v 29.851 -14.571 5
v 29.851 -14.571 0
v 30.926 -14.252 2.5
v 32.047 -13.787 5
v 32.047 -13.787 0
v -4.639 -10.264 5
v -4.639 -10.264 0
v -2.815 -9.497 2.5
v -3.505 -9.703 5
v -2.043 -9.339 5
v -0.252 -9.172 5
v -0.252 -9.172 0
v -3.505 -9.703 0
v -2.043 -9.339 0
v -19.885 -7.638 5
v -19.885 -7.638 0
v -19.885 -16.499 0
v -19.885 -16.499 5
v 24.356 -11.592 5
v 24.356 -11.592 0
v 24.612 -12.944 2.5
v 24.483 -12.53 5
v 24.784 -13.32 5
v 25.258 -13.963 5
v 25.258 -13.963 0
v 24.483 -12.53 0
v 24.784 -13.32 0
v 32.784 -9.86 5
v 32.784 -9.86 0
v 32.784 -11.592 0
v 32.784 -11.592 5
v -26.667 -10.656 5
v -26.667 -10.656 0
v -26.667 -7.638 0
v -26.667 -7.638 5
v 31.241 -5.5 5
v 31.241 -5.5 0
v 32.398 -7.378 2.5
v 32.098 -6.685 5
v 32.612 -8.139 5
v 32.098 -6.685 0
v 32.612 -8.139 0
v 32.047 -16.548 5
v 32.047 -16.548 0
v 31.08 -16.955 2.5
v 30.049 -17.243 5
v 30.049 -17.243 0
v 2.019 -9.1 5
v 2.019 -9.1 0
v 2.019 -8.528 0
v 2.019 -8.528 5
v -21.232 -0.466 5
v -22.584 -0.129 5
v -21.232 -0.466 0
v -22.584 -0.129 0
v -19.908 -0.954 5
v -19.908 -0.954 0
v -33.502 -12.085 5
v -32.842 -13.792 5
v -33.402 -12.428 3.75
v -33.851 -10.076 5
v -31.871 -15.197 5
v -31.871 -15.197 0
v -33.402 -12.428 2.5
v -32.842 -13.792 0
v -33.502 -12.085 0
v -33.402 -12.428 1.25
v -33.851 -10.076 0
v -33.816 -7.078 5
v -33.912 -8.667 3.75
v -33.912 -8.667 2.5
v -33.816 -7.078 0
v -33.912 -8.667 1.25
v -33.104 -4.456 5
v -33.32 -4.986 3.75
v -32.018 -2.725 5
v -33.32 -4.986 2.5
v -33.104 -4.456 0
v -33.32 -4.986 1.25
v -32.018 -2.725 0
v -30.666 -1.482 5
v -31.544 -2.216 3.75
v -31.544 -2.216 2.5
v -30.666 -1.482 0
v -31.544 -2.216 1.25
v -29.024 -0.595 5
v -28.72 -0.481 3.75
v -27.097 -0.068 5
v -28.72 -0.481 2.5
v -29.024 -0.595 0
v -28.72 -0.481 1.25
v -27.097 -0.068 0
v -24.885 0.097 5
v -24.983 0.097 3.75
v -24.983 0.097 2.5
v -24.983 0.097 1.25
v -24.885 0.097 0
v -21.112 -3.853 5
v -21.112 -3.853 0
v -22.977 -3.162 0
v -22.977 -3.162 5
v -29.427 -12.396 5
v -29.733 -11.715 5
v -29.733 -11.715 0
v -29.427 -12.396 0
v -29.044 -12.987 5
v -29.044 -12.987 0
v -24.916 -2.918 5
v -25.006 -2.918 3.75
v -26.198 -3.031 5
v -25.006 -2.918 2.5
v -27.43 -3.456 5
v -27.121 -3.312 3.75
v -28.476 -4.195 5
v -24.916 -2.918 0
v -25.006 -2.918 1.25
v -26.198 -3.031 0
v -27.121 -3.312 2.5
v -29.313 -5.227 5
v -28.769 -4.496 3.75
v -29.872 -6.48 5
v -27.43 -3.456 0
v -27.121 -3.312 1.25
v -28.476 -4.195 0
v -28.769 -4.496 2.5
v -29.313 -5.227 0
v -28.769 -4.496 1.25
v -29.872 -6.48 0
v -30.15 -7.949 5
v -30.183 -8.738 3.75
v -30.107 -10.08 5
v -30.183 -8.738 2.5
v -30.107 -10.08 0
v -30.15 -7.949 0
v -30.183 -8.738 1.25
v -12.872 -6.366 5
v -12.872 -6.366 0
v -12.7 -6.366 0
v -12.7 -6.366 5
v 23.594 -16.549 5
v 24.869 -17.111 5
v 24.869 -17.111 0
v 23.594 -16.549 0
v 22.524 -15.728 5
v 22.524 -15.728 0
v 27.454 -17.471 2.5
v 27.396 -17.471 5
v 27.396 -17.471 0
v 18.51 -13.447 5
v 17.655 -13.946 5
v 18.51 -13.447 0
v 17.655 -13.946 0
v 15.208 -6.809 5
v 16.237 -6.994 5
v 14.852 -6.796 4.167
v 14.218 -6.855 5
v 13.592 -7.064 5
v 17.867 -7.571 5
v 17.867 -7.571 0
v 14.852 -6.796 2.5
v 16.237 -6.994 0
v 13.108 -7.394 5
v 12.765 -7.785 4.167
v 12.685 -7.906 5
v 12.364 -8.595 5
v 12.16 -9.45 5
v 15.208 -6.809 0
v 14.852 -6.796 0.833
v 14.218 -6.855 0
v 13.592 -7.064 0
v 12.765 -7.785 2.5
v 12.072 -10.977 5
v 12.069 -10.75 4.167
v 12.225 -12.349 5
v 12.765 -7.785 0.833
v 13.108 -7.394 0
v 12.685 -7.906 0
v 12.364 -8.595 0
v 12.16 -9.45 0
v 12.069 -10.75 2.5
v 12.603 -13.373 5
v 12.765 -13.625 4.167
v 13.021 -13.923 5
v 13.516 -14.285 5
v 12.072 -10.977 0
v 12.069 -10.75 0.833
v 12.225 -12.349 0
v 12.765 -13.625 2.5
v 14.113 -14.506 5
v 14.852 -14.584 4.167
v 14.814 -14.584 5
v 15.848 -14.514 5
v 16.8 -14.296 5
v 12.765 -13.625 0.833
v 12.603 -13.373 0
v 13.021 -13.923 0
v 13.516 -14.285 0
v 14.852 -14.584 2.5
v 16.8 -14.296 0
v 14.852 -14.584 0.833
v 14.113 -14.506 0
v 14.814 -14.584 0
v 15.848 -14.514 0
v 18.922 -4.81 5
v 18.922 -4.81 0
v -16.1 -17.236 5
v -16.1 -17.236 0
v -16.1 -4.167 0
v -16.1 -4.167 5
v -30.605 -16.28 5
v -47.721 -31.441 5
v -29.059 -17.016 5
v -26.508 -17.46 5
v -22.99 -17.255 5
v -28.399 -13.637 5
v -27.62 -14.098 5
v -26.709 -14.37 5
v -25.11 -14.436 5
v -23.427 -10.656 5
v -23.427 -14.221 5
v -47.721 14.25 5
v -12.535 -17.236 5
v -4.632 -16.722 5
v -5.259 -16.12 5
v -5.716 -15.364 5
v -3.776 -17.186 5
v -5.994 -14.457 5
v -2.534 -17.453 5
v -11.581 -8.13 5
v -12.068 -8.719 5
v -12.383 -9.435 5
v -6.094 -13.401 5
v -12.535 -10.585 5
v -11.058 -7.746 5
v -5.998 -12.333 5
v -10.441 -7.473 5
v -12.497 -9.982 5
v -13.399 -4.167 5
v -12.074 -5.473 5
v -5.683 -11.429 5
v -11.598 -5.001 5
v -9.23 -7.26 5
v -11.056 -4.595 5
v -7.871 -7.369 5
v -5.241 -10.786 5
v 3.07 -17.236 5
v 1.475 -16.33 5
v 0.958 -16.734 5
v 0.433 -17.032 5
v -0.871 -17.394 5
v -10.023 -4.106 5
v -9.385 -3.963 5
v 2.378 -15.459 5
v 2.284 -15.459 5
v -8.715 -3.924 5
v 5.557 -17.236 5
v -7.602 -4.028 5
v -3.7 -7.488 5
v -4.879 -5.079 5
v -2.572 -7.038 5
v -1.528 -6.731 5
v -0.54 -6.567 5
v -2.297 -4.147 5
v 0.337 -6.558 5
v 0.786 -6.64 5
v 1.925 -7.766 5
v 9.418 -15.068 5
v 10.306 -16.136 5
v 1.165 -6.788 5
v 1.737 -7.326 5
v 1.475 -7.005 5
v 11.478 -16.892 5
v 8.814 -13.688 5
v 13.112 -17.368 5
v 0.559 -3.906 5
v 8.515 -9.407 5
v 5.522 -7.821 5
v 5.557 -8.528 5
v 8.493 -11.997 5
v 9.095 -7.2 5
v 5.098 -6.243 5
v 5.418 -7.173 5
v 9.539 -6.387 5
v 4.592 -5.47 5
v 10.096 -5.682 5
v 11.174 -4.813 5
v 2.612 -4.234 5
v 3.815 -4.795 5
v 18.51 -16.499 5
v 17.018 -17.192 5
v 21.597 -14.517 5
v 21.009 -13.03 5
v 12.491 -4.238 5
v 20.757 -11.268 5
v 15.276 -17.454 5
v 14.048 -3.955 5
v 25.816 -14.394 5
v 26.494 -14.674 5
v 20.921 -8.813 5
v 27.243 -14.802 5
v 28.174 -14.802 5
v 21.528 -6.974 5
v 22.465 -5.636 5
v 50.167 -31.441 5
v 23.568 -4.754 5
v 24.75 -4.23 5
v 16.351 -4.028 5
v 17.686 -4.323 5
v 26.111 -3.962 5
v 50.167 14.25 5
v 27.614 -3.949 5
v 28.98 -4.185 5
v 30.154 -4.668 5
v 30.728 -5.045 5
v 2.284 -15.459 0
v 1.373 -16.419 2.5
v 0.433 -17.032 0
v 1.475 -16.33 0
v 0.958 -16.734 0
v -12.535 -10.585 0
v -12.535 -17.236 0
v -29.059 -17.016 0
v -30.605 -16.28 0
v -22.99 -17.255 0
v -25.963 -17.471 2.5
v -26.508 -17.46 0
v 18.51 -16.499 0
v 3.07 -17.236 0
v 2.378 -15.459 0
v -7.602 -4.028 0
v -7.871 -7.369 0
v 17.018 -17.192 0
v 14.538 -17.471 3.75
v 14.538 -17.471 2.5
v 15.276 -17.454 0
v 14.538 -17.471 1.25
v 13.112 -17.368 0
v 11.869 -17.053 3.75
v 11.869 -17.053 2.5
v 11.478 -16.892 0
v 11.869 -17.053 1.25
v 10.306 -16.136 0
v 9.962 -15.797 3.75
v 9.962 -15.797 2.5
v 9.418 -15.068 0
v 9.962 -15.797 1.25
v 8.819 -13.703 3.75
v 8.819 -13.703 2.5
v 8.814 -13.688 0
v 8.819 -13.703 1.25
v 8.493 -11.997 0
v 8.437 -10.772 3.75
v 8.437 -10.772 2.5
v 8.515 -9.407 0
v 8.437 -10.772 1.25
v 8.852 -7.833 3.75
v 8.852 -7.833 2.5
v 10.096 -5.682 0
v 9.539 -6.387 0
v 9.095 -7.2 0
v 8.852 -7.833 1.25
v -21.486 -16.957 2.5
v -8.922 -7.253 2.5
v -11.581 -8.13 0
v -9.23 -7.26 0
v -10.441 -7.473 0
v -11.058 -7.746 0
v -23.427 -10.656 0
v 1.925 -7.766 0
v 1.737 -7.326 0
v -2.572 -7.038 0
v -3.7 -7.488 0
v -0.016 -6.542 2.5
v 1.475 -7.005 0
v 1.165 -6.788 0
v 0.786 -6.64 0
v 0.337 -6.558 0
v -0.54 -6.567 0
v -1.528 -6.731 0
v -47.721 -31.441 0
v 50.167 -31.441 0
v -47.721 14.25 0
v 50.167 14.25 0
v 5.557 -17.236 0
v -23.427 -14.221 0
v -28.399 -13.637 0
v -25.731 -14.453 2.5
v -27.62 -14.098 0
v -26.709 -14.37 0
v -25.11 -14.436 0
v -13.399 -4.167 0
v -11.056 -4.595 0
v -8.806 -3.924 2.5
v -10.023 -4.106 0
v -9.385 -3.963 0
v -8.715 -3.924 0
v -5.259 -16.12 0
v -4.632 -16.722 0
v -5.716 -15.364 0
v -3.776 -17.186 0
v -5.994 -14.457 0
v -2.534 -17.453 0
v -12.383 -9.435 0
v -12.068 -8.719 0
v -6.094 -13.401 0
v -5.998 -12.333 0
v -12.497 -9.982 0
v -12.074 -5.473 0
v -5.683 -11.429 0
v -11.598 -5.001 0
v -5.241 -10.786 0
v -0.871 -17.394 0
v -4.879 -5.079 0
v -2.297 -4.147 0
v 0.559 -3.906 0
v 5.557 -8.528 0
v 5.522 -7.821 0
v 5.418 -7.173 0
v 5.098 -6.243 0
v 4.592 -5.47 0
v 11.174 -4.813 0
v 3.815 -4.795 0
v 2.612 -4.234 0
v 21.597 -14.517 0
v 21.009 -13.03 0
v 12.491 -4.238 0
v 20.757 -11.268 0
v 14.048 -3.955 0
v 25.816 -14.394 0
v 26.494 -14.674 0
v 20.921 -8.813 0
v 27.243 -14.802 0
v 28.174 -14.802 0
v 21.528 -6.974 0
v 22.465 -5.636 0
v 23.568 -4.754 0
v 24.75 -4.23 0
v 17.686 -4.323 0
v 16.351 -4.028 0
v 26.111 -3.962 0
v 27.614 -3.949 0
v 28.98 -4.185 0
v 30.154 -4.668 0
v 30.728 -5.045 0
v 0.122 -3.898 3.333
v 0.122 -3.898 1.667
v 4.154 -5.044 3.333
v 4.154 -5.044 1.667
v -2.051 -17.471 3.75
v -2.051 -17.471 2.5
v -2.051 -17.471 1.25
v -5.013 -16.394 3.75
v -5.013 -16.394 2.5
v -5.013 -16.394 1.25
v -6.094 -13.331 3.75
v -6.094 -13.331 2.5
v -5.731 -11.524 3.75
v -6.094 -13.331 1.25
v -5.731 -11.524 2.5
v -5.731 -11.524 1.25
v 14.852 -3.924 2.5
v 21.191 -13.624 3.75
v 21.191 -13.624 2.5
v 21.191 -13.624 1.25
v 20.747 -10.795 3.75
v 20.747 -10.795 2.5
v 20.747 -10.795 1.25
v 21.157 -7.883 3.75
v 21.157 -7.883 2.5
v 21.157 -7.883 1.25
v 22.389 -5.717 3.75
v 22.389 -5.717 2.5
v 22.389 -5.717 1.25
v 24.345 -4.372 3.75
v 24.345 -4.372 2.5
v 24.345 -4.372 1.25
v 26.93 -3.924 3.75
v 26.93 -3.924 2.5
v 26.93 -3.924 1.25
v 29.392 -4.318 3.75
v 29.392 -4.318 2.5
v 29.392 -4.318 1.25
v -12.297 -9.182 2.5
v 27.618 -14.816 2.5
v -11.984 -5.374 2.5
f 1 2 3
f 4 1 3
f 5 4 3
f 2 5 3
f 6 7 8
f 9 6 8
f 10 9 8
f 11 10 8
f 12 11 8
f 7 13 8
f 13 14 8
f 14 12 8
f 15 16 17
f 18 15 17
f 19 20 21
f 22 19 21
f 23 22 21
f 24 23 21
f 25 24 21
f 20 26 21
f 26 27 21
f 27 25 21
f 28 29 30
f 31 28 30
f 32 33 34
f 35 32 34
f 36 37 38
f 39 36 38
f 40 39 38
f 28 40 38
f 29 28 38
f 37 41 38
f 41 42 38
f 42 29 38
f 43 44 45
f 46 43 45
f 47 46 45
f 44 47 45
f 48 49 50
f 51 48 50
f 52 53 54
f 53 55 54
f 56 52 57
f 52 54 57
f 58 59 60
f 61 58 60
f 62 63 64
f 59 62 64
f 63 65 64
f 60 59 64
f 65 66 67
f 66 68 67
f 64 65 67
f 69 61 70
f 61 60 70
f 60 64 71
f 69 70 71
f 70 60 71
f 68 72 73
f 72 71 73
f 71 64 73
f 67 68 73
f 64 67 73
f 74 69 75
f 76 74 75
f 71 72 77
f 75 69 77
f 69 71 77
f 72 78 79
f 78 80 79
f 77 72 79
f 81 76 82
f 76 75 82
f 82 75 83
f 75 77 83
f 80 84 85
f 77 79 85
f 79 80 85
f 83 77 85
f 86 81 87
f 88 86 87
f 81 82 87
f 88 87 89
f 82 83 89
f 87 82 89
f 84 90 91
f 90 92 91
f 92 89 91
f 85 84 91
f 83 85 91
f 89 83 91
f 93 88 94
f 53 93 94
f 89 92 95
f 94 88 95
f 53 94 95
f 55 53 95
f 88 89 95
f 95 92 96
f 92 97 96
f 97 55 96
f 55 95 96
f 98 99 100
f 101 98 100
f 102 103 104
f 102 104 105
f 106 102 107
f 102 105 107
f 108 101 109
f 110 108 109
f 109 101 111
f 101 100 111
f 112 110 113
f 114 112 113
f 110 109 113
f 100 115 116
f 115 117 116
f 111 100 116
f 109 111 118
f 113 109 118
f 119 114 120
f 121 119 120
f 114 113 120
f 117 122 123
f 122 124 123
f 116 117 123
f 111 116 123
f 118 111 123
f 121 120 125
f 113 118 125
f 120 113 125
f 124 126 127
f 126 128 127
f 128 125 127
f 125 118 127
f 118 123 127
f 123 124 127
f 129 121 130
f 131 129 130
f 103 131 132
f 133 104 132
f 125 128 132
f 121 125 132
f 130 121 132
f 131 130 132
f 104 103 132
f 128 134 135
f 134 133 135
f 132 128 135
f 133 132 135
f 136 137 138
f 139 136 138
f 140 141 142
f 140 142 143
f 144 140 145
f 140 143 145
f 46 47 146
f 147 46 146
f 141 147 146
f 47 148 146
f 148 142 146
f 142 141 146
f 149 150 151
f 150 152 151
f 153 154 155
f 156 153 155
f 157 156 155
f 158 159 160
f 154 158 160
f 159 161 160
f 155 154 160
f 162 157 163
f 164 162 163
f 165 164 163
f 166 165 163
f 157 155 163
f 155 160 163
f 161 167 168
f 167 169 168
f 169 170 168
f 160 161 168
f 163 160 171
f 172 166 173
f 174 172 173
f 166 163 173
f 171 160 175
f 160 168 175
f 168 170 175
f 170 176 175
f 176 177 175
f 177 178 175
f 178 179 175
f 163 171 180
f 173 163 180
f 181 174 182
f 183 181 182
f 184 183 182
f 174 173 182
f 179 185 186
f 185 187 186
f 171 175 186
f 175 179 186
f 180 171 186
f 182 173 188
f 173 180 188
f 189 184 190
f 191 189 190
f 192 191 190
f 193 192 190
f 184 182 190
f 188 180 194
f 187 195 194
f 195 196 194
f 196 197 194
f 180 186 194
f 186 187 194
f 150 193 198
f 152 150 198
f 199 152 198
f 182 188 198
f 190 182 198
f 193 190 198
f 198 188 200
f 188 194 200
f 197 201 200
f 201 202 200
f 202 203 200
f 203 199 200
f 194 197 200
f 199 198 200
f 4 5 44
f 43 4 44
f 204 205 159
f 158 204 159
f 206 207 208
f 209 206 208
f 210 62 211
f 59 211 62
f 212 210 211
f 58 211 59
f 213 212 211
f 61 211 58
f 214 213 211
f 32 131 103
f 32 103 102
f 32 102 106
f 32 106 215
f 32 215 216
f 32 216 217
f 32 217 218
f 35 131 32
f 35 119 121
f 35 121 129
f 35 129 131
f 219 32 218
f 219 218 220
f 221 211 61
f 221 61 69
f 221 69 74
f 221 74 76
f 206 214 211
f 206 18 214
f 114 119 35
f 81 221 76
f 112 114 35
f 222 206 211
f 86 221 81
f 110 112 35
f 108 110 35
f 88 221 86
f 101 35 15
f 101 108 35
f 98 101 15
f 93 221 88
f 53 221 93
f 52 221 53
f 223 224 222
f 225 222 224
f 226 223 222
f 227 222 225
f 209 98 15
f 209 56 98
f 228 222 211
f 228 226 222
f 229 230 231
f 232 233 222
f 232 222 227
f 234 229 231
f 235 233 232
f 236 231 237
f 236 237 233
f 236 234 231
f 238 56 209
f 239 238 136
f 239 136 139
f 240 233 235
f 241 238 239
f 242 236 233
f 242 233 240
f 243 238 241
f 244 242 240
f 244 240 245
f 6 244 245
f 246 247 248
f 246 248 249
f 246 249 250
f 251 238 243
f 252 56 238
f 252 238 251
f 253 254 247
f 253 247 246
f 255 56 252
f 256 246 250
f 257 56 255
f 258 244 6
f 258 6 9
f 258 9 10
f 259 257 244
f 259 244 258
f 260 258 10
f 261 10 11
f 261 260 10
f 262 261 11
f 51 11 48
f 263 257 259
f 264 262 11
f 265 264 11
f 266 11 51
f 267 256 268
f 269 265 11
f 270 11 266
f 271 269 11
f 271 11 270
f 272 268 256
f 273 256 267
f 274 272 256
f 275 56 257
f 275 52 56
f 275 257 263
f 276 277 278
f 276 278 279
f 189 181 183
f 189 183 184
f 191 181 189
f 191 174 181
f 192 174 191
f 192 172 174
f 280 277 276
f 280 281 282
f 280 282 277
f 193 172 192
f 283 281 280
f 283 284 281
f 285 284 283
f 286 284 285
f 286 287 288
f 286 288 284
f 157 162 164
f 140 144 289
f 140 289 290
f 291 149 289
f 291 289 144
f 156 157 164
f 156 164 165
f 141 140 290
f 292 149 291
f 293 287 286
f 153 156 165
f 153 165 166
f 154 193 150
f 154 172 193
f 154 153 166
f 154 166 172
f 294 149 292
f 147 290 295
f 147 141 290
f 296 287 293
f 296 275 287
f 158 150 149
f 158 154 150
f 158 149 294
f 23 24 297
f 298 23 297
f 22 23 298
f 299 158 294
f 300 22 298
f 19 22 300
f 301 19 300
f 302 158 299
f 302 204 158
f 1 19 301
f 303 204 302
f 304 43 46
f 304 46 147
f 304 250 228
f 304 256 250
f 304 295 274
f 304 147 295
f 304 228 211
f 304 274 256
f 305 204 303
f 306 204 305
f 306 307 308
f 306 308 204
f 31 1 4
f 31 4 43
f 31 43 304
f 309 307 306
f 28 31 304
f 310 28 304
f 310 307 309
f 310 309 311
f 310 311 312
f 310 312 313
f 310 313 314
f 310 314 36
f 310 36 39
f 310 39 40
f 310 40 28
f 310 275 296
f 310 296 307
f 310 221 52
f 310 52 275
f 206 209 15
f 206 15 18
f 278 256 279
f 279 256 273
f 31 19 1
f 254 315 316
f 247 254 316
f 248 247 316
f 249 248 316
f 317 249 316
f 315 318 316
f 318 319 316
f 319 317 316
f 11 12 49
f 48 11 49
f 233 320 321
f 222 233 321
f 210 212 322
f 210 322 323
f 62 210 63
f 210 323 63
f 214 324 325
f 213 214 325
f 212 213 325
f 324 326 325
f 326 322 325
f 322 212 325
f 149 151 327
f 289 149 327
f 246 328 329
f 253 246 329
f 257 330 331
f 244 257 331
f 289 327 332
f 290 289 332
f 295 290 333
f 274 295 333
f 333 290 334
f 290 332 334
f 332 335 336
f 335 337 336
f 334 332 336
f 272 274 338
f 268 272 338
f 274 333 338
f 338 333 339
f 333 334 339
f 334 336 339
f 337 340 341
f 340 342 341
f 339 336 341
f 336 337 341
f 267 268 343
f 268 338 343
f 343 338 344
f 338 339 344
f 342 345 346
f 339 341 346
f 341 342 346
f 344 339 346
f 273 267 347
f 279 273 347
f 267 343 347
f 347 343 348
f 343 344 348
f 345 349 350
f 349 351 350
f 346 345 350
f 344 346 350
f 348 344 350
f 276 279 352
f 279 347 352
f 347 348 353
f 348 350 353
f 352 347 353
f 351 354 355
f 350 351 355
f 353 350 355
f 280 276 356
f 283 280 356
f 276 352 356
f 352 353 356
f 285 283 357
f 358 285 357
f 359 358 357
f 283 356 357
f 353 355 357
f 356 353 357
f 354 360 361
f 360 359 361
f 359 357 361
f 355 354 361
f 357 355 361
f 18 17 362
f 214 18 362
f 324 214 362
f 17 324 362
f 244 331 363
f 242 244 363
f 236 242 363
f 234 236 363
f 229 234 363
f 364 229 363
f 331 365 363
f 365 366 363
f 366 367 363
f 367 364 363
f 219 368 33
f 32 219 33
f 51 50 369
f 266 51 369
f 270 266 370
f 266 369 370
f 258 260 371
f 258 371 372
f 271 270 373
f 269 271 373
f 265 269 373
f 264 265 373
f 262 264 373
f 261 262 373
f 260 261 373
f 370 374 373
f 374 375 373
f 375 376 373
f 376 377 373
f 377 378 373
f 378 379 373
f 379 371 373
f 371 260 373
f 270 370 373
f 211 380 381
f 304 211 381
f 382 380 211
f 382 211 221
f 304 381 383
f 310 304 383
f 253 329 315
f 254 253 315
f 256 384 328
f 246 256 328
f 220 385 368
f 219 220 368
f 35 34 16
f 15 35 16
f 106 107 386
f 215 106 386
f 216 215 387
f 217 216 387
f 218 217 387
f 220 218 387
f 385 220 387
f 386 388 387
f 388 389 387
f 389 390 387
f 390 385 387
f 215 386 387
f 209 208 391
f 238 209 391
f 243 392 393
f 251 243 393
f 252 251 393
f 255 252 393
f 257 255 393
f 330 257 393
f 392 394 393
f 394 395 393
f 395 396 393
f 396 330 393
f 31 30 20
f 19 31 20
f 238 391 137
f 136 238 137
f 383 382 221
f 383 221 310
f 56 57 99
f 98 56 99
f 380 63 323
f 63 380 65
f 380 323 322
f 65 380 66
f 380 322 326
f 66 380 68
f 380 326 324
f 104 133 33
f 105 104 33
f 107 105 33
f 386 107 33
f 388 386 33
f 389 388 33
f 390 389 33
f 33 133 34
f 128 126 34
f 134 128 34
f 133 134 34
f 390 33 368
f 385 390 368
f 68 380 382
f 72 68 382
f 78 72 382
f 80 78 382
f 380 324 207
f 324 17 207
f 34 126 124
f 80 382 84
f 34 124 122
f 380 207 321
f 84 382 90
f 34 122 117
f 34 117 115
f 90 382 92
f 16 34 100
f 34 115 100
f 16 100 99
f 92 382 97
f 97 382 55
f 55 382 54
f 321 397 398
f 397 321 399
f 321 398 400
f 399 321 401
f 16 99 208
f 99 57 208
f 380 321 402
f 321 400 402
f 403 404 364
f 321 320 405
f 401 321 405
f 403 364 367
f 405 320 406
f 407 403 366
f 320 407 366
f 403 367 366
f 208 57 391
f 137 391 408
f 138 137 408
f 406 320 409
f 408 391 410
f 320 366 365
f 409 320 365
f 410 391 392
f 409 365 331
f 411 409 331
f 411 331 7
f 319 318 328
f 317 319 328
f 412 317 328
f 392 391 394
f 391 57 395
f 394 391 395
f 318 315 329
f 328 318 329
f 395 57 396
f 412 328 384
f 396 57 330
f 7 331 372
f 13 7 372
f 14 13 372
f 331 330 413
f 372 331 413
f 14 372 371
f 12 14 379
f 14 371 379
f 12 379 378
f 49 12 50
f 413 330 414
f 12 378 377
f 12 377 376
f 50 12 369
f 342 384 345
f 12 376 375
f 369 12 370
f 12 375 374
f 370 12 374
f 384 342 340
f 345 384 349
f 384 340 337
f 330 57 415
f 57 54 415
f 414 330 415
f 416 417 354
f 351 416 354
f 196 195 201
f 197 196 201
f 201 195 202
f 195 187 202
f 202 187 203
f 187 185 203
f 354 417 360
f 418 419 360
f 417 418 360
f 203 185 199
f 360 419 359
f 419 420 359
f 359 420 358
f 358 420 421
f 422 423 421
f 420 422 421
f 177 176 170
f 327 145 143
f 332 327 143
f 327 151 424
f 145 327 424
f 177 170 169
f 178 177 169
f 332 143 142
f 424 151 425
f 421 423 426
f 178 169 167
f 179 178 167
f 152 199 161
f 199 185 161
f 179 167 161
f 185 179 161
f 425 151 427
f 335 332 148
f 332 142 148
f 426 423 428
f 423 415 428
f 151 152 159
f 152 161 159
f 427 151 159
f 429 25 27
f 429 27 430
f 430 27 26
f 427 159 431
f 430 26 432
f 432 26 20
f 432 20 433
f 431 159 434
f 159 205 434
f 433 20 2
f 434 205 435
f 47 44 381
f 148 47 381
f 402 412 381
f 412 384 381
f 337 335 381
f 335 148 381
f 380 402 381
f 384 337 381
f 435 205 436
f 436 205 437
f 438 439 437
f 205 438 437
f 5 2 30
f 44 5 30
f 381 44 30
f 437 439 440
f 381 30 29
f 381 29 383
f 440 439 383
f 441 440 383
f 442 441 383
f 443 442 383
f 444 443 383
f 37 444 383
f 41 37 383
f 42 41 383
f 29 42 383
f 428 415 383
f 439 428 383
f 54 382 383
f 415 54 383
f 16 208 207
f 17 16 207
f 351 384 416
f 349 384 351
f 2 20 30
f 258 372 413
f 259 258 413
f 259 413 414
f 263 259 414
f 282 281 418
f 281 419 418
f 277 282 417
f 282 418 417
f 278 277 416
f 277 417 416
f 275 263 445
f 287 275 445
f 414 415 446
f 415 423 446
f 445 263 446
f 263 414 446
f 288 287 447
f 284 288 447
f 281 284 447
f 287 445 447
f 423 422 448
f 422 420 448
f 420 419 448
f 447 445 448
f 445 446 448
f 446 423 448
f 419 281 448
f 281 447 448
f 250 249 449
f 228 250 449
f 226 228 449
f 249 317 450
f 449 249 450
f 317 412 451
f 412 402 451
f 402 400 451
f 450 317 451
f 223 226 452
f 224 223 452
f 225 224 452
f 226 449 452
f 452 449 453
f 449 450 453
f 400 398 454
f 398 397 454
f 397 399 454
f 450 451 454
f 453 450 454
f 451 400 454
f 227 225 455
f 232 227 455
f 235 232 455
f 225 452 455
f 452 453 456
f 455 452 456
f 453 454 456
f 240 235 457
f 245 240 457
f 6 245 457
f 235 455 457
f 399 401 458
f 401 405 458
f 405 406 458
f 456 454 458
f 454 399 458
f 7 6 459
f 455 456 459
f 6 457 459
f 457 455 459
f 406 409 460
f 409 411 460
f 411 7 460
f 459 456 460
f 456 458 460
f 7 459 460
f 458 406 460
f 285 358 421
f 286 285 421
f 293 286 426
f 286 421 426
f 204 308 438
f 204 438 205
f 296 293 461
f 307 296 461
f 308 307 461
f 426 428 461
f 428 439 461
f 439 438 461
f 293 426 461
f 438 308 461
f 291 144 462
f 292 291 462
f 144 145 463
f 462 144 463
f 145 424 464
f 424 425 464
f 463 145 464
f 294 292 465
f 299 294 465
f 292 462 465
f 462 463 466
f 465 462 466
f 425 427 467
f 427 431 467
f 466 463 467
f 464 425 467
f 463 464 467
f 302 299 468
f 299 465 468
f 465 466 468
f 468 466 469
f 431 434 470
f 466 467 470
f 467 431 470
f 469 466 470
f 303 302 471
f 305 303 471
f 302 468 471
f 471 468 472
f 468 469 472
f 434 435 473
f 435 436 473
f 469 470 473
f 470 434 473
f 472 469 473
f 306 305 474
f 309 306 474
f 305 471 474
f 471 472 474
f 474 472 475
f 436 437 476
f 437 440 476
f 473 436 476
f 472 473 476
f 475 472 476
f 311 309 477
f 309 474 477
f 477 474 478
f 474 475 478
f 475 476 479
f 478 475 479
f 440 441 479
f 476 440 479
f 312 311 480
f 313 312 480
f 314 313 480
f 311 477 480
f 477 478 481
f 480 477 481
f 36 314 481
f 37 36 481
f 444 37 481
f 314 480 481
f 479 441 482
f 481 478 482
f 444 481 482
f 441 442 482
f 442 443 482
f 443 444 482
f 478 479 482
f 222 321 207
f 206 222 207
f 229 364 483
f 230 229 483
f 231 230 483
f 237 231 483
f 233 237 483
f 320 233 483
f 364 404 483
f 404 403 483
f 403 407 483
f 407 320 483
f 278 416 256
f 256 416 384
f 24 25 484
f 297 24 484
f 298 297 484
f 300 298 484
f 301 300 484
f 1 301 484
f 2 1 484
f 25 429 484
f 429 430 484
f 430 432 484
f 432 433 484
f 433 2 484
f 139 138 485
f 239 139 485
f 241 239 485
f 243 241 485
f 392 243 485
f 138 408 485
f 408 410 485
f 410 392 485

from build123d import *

# Parameters (mm, degrees)
F0_W     = 97.8876724839
F0_H     = 45.6908610649
F1_DEPTH = 5


with BuildPart() as f1:
    # F0 (on Top) → F1 (new body)
    with BuildSketch(Plane.XY):
        with Locations((1.2231161818, -8.5958049167)):
            Rectangle(F0_W, F0_H)
        with BuildLine():
            Line((-26.666582018, -10.6564535441), (-26.666582018, -7.637935464))
            Line((-26.666582018, -7.637935464), (-19.8852024899, -7.637935464))
            Line((-19.8852024899, -7.637935464), (-19.8852024899, -16.4989879196))
            add(Edge.make_bspline(
                [(-19.8852024899, -16.4989879196), (-21.53472724, -17.0376082461), (-22.9897502054, -17.2545525443)],
                knots=[0, 0, 0, 1, 1, 1], degree=2))
            add(Edge.make_bspline(
                [(-22.9897502054, -17.2545525443), (-24.4447731709, -17.4714968425), (-25.9633832583, -17.4714968425)],
                knots=[0, 0, 0, 1, 1, 1], degree=2))
            add(Edge.make_bspline(
                [(-25.9633832583, -17.4714968425), (-29.8309764364, -17.4714968425), (-31.8713749652, -15.1973221304)],
                knots=[0, 0, 0, 1, 1, 1], degree=2))
            add(Edge.make_bspline(
                [(-31.8713749652, -15.1973221304), (-33.9117734939, -12.9231474183), (-33.9117734939, -8.666550671)],
                knots=[0, 0, 0, 1, 1, 1], degree=2))
            add(Edge.make_bspline(
                [(-33.9117734939, -8.666550671), (-33.9117734939, -4.5296473295), (-31.5440883084, -2.2161982186)],
                knots=[0, 0, 0, 1, 1, 1], degree=2))
            add(Edge.make_bspline(
                [(-31.5440883084, -2.2161982186), (-29.1764031229, 0.0972508923), (-24.9833934975, 0.0972508923)],
                knots=[0, 0, 0, 1, 1, 1], degree=2))
            add(Edge.make_bspline(
                [(-24.9833934975, 0.0972508923), (-22.3501385677, 0.0972508923), (-19.9076450035, -0.9538068283)],
                knots=[0, 0, 0, 1, 1, 1], degree=2))
            Line((-19.9076450035, -0.9538068283), (-21.1120599004, -3.8526315024))
            add(Edge.make_bspline(
                [(-21.1120599004, -3.8526315024), (-22.9822693676, -2.9175267688), (-25.0058360111, -2.9175267688)],
                knots=[0, 0, 0, 1, 1, 1], degree=2))
            add(Edge.make_bspline(
                [(-25.0058360111, -2.9175267688), (-27.3548191019, -2.9175267688), (-28.7686974591, -4.4959835591)],
                knots=[0, 0, 0, 1, 1, 1], degree=2))
            add(Edge.make_bspline(
                [(-28.7686974591, -4.4959835591), (-30.1825758163, -6.0744403494), (-30.1825758163, -8.7376186307)],
                knots=[0, 0, 0, 1, 1, 1], degree=2))
            add(Edge.make_bspline(
                [(-30.1825758163, -8.7376186307), (-30.1825758163, -11.5204903179), (-29.0436182508, -12.9867345402)],
                knots=[0, 0, 0, 1, 1, 1], degree=2))
            add(Edge.make_bspline(
                [(-29.0436182508, -12.9867345402), (-27.9046606852, -14.4529787625), (-25.7314772844, -14.4529787625)],
                knots=[0, 0, 0, 1, 1, 1], degree=2))
            add(Edge.make_bspline(
                [(-25.7314772844, -14.4529787625), (-24.5943899283, -14.4529787625), (-23.4273792208, -14.2210727885)],
                knots=[0, 0, 0, 1, 1, 1], degree=2))
            Line((-23.4273792208, -14.2210727885), (-23.4273792208, -10.6564535441))
            Line((-23.4273792208, -10.6564535441), (-26.666582018, -10.6564535441))
        make_face(mode=Mode.SUBTRACT)
        with BuildLine():
            add(Edge.make_bspline(
                [(-11.0559435953, -4.5951046609), (-10.0217177599, -3.9236994622), (-8.8060816063, -3.9236994622)],
                knots=[0, 0, 0, 1, 1, 1], degree=2))
            add(Edge.make_bspline(
                [(-8.8060816063, -3.9236994622), (-8.080440333, -3.9236994622), (-7.6016667094, -4.0284311923)],
                knots=[0, 0, 0, 1, 1, 1], degree=2))
            Line((-7.6016667094, -4.0284311923), (-7.8709768727, -7.3686253007))
            add(Edge.make_bspline(
                [(-7.8709768727, -7.3686253007), (-8.304865469, -7.2526723138), (-8.9220345932, -7.2526723138)],
                knots=[0, 0, 0, 1, 1, 1], degree=2))
            add(Edge.make_bspline(
                [(-8.9220345932, -7.2526723138), (-10.6276656273, -7.2526723138), (-11.5814724556, -8.1298005539)],
                knots=[0, 0, 0, 1, 1, 1], degree=2))
            add(Edge.make_bspline(
                [(-11.5814724556, -8.1298005539), (-12.5352792838, -9.006928794), (-12.5352792838, -10.5853855843)],
                knots=[0, 0, 0, 1, 1, 1], degree=2))
            Line((-12.5352792838, -10.5853855843), (-12.5352792838, -17.2358504497))
            Line((-12.5352792838, -17.2358504497), (-16.0998985283, -17.2358504497))
            Line((-16.0998985283, -17.2358504497), (-16.0998985283, -4.1668266929))
            Line((-16.0998985283, -4.1668266929), (-13.3993160577, -4.1668266929))
            Line((-13.3993160577, -4.1668266929), (-12.8719169879, -6.3661930263))
            Line((-12.8719169879, -6.3661930263), (-12.699857717, -6.3661930263))
            add(Edge.make_bspline(
                [(-12.699857717, -6.3661930263), (-12.0901694306, -5.2665098596), (-11.0559435953, -4.5951046609)],
                knots=[0, 0, 0, 1, 1, 1], degree=2))
        make_face(mode=Mode.SUBTRACT)
        with BuildLine():
            Line((5.5571271018, -17.2358504497), (3.0697485104, -17.2358504497))
            Line((3.0697485104, -17.2358504497), (2.3777710076, -15.4591514558))
            Line((2.3777710076, -15.4591514558), (2.2842605342, -15.4591514558))
            add(Edge.make_bspline(
                [(2.2842605342, -15.4591514558), (1.3865599899, -16.5924983929), (0.4327531617, -17.0319976177)],
                knots=[0, 0, 0, 1, 1, 1], degree=2))
            add(Edge.make_bspline(
                [(0.4327531617, -17.0319976177), (-0.5210536666, -17.4714968425), (-2.0508850108, -17.4714968425)],
                knots=[0, 0, 0, 1, 1, 1], degree=2))
            add(Edge.make_bspline(
                [(-2.0508850108, -17.4714968425), (-3.9323157348, -17.4714968425), (-5.0132968068, -16.3942561894)],
                knots=[0, 0, 0, 1, 1, 1], degree=2))
            add(Edge.make_bspline(
                [(-5.0132968068, -16.3942561894), (-6.0942778788, -15.3170155363), (-6.0942778788, -13.3308530822)],
                knots=[0, 0, 0, 1, 1, 1], degree=2))
            add(Edge.make_bspline(
                [(-6.0942778788, -13.3308530822), (-6.0942778788, -11.2511801546), (-4.6392549133, -10.263709556)],
                knots=[0, 0, 0, 1, 1, 1], degree=2))
            add(Edge.make_bspline(
                [(-4.6392549133, -10.263709556), (-3.1842319479, -9.2762389573), (-0.2517435033, -9.1715072271)],
                knots=[0, 0, 0, 1, 1, 1], degree=2))
            Line((-0.2517435033, -9.1715072271), (2.0186907899, -9.1004392674))
            Line((2.0186907899, -9.1004392674), (2.0186907899, -8.5281551704))
            add(Edge.make_bspline(
                [(2.0186907899, -8.5281551704), (2.0186907899, -6.5419927162), (-0.0160971104, -6.5419927162)],
                knots=[0, 0, 0, 1, 1, 1], degree=2))
            add(Edge.make_bspline(
                [(-0.0160971104, -6.5419927162), (-1.583332644, -6.5419927162), (-3.7004097608, -7.4883187066)],
                knots=[0, 0, 0, 1, 1, 1], degree=2))
            Line((-3.7004097608, -7.4883187066), (-4.8786417252, -5.0794889129))
            add(Edge.make_bspline(
                [(-4.8786417252, -5.0794889129), (-2.6231691077, -3.8975165296), (0.1222983901, -3.8975165296)],
                knots=[0, 0, 0, 1, 1, 1], degree=2))
            add(Edge.make_bspline(
                [(0.1222983901, -3.8975165296), (2.751812901, -3.8975165296), (4.1544700014, -5.043954933)],
                knots=[0, 0, 0, 1, 1, 1], degree=2))
            add(Edge.make_bspline(
                [(4.1544700014, -5.043954933), (5.5571271018, -6.1903933364), (5.5571271018, -8.5281551704)],
                knots=[0, 0, 0, 1, 1, 1], degree=2))
            Line((5.5571271018, -8.5281551704), (5.5571271018, -17.2358504497))
        make_face(mode=Mode.SUBTRACT)
        with BuildLine():
            add(Edge.make_bspline(
                [(16.7634222292, -17.2601631727), (15.8806833607, -17.4714968425), (14.5378729632, -17.4714968425)],
                knots=[0, 0, 0, 1, 1, 1], degree=2))
            add(Edge.make_bspline(
                [(14.5378729632, -17.4714968425), (8.4372496813, -17.4714968425), (8.4372496813, -10.772406531)],
                knots=[0, 0, 0, 1, 1, 1], degree=2))
            add(Edge.make_bspline(
                [(8.4372496813, -10.772406531), (8.4372496813, -7.4396932605), (10.0961254787, -5.6816963613)],
                knots=[0, 0, 0, 1, 1, 1], degree=2))
            add(Edge.make_bspline(
                [(10.0961254787, -5.6816963613), (11.7550012761, -3.9236994622), (14.8520681537, -3.9236994622)],
                knots=[0, 0, 0, 1, 1, 1], degree=2))
            add(Edge.make_bspline(
                [(14.8520681537, -3.9236994622), (17.118762028, -3.9236994622), (18.9216439544, -4.8101787496)],
                knots=[0, 0, 0, 1, 1, 1], degree=2))
            Line((18.9216439544, -4.8101787496), (17.8668458149, -7.5706079232))
            add(Edge.make_bspline(
                [(17.8668458149, -7.5706079232), (17.0252515546, -7.2302298002), (16.3014804908, -7.013285502)],
                knots=[0, 0, 0, 1, 1, 1], degree=2))
            add(Edge.make_bspline(
                [(16.3014804908, -7.013285502), (15.577709427, -6.7963412038), (14.8520681537, -6.7963412038)],
                knots=[0, 0, 0, 1, 1, 1], degree=2))
            add(Edge.make_bspline(
                [(14.8520681537, -6.7963412038), (12.0691964666, -6.7963412038), (12.0691964666, -10.7499640174)],
                knots=[0, 0, 0, 1, 1, 1], degree=2))
            add(Edge.make_bspline(
                [(12.0691964666, -10.7499640174), (12.0691964666, -14.5838934252), (14.8520681537, -14.5838934252)],
                knots=[0, 0, 0, 1, 1, 1], degree=2))
            add(Edge.make_bspline(
                [(14.8520681537, -14.5838934252), (15.8806833607, -14.5838934252), (16.7578116008, -14.3089726335)],
                knots=[0, 0, 0, 1, 1, 1], degree=2))
            add(Edge.make_bspline(
                [(16.7578116008, -14.3089726335), (17.6349398409, -14.0340518418), (18.5101978716, -13.4468060691)],
                knots=[0, 0, 0, 1, 1, 1], degree=2))
            Line((18.5101978716, -13.4468060691), (18.5101978716, -16.4989879196))
            add(Edge.make_bspline(
                [(18.5101978716, -16.4989879196), (17.6461610977, -17.0488295029), (16.7634222292, -17.2601631727)],
                knots=[0, 0, 0, 1, 1, 1], degree=2))
        make_face(mode=Mode.SUBTRACT)
        with BuildLine():
            add(Edge.make_bspline(
                [(30.0493902842, -17.2433312875), (28.9871113068, -17.4714968425), (27.4535395437, -17.4714968425)],
                knots=[0, 0, 0, 1, 1, 1], degree=2))
            add(Edge.make_bspline(
                [(27.4535395437, -17.4714968425), (24.300366382, -17.4714968425), (22.5236673882, -15.7284616191)],
                knots=[0, 0, 0, 1, 1, 1], degree=2))
            add(Edge.make_bspline(
                [(22.5236673882, -15.7284616191), (20.7469683943, -13.9854263957), (20.7469683943, -10.7948490446)],
                knots=[0, 0, 0, 1, 1, 1], degree=2))
            add(Edge.make_bspline(
                [(20.7469683943, -10.7948490446), (20.7469683943, -7.5107612202), (22.3890123065, -5.7172303412)],
                knots=[0, 0, 0, 1, 1, 1], degree=2))
            add(Edge.make_bspline(
                [(22.3890123065, -5.7172303412), (24.0310562187, -3.9236994622), (26.9298808929, -3.9236994622)],
                knots=[0, 0, 0, 1, 1, 1], degree=2))
            add(Edge.make_bspline(
                [(26.9298808929, -3.9236994622), (29.6977909043, -3.9236994622), (31.2407137148, -5.500286043)],
                knots=[0, 0, 0, 1, 1, 1], degree=2))
            add(Edge.make_bspline(
                [(31.2407137148, -5.500286043), (32.7836365252, -7.0768726239), (32.7836365252, -9.859744311)],
                knots=[0, 0, 0, 1, 1, 1], degree=2))
            Line((32.7836365252, -9.859744311), (32.7836365252, -11.5915582777))
            Line((32.7836365252, -11.5915582777), (24.356472666, -11.5915582777))
            add(Edge.make_bspline(
                [(24.356472666, -11.5915582777), (24.416319369, -13.110168365), (25.2579136292, -13.9629838821)],
                knots=[0, 0, 0, 1, 1, 1], degree=2))
            add(Edge.make_bspline(
                [(25.2579136292, -13.9629838821), (26.0995078894, -14.8157993991), (27.6181179768, -14.8157993991)],
                knots=[0, 0, 0, 1, 1, 1], degree=2))
            add(Edge.make_bspline(
                [(27.6181179768, -14.8157993991), (28.8000903601, -14.8157993991), (29.8511480806, -14.5708019589)],
                knots=[0, 0, 0, 1, 1, 1], degree=2))
            add(Edge.make_bspline(
                [(29.8511480806, -14.5708019589), (30.9022058012, -14.3258045187), (32.0467739951, -13.7871841921)],
                knots=[0, 0, 0, 1, 1, 1], degree=2))
            Line((32.0467739951, -13.7871841921), (32.0467739951, -16.5476133657))
            add(Edge.make_bspline(
                [(32.0467739951, -16.5476133657), (31.1116692615, -17.0151657325), (30.0493902842, -17.2433312875)],
                knots=[0, 0, 0, 1, 1, 1], degree=2))
        make_face(mode=Mode.SUBTRACT)
    extrude(amount=F1_DEPTH)


solid = f1.part
